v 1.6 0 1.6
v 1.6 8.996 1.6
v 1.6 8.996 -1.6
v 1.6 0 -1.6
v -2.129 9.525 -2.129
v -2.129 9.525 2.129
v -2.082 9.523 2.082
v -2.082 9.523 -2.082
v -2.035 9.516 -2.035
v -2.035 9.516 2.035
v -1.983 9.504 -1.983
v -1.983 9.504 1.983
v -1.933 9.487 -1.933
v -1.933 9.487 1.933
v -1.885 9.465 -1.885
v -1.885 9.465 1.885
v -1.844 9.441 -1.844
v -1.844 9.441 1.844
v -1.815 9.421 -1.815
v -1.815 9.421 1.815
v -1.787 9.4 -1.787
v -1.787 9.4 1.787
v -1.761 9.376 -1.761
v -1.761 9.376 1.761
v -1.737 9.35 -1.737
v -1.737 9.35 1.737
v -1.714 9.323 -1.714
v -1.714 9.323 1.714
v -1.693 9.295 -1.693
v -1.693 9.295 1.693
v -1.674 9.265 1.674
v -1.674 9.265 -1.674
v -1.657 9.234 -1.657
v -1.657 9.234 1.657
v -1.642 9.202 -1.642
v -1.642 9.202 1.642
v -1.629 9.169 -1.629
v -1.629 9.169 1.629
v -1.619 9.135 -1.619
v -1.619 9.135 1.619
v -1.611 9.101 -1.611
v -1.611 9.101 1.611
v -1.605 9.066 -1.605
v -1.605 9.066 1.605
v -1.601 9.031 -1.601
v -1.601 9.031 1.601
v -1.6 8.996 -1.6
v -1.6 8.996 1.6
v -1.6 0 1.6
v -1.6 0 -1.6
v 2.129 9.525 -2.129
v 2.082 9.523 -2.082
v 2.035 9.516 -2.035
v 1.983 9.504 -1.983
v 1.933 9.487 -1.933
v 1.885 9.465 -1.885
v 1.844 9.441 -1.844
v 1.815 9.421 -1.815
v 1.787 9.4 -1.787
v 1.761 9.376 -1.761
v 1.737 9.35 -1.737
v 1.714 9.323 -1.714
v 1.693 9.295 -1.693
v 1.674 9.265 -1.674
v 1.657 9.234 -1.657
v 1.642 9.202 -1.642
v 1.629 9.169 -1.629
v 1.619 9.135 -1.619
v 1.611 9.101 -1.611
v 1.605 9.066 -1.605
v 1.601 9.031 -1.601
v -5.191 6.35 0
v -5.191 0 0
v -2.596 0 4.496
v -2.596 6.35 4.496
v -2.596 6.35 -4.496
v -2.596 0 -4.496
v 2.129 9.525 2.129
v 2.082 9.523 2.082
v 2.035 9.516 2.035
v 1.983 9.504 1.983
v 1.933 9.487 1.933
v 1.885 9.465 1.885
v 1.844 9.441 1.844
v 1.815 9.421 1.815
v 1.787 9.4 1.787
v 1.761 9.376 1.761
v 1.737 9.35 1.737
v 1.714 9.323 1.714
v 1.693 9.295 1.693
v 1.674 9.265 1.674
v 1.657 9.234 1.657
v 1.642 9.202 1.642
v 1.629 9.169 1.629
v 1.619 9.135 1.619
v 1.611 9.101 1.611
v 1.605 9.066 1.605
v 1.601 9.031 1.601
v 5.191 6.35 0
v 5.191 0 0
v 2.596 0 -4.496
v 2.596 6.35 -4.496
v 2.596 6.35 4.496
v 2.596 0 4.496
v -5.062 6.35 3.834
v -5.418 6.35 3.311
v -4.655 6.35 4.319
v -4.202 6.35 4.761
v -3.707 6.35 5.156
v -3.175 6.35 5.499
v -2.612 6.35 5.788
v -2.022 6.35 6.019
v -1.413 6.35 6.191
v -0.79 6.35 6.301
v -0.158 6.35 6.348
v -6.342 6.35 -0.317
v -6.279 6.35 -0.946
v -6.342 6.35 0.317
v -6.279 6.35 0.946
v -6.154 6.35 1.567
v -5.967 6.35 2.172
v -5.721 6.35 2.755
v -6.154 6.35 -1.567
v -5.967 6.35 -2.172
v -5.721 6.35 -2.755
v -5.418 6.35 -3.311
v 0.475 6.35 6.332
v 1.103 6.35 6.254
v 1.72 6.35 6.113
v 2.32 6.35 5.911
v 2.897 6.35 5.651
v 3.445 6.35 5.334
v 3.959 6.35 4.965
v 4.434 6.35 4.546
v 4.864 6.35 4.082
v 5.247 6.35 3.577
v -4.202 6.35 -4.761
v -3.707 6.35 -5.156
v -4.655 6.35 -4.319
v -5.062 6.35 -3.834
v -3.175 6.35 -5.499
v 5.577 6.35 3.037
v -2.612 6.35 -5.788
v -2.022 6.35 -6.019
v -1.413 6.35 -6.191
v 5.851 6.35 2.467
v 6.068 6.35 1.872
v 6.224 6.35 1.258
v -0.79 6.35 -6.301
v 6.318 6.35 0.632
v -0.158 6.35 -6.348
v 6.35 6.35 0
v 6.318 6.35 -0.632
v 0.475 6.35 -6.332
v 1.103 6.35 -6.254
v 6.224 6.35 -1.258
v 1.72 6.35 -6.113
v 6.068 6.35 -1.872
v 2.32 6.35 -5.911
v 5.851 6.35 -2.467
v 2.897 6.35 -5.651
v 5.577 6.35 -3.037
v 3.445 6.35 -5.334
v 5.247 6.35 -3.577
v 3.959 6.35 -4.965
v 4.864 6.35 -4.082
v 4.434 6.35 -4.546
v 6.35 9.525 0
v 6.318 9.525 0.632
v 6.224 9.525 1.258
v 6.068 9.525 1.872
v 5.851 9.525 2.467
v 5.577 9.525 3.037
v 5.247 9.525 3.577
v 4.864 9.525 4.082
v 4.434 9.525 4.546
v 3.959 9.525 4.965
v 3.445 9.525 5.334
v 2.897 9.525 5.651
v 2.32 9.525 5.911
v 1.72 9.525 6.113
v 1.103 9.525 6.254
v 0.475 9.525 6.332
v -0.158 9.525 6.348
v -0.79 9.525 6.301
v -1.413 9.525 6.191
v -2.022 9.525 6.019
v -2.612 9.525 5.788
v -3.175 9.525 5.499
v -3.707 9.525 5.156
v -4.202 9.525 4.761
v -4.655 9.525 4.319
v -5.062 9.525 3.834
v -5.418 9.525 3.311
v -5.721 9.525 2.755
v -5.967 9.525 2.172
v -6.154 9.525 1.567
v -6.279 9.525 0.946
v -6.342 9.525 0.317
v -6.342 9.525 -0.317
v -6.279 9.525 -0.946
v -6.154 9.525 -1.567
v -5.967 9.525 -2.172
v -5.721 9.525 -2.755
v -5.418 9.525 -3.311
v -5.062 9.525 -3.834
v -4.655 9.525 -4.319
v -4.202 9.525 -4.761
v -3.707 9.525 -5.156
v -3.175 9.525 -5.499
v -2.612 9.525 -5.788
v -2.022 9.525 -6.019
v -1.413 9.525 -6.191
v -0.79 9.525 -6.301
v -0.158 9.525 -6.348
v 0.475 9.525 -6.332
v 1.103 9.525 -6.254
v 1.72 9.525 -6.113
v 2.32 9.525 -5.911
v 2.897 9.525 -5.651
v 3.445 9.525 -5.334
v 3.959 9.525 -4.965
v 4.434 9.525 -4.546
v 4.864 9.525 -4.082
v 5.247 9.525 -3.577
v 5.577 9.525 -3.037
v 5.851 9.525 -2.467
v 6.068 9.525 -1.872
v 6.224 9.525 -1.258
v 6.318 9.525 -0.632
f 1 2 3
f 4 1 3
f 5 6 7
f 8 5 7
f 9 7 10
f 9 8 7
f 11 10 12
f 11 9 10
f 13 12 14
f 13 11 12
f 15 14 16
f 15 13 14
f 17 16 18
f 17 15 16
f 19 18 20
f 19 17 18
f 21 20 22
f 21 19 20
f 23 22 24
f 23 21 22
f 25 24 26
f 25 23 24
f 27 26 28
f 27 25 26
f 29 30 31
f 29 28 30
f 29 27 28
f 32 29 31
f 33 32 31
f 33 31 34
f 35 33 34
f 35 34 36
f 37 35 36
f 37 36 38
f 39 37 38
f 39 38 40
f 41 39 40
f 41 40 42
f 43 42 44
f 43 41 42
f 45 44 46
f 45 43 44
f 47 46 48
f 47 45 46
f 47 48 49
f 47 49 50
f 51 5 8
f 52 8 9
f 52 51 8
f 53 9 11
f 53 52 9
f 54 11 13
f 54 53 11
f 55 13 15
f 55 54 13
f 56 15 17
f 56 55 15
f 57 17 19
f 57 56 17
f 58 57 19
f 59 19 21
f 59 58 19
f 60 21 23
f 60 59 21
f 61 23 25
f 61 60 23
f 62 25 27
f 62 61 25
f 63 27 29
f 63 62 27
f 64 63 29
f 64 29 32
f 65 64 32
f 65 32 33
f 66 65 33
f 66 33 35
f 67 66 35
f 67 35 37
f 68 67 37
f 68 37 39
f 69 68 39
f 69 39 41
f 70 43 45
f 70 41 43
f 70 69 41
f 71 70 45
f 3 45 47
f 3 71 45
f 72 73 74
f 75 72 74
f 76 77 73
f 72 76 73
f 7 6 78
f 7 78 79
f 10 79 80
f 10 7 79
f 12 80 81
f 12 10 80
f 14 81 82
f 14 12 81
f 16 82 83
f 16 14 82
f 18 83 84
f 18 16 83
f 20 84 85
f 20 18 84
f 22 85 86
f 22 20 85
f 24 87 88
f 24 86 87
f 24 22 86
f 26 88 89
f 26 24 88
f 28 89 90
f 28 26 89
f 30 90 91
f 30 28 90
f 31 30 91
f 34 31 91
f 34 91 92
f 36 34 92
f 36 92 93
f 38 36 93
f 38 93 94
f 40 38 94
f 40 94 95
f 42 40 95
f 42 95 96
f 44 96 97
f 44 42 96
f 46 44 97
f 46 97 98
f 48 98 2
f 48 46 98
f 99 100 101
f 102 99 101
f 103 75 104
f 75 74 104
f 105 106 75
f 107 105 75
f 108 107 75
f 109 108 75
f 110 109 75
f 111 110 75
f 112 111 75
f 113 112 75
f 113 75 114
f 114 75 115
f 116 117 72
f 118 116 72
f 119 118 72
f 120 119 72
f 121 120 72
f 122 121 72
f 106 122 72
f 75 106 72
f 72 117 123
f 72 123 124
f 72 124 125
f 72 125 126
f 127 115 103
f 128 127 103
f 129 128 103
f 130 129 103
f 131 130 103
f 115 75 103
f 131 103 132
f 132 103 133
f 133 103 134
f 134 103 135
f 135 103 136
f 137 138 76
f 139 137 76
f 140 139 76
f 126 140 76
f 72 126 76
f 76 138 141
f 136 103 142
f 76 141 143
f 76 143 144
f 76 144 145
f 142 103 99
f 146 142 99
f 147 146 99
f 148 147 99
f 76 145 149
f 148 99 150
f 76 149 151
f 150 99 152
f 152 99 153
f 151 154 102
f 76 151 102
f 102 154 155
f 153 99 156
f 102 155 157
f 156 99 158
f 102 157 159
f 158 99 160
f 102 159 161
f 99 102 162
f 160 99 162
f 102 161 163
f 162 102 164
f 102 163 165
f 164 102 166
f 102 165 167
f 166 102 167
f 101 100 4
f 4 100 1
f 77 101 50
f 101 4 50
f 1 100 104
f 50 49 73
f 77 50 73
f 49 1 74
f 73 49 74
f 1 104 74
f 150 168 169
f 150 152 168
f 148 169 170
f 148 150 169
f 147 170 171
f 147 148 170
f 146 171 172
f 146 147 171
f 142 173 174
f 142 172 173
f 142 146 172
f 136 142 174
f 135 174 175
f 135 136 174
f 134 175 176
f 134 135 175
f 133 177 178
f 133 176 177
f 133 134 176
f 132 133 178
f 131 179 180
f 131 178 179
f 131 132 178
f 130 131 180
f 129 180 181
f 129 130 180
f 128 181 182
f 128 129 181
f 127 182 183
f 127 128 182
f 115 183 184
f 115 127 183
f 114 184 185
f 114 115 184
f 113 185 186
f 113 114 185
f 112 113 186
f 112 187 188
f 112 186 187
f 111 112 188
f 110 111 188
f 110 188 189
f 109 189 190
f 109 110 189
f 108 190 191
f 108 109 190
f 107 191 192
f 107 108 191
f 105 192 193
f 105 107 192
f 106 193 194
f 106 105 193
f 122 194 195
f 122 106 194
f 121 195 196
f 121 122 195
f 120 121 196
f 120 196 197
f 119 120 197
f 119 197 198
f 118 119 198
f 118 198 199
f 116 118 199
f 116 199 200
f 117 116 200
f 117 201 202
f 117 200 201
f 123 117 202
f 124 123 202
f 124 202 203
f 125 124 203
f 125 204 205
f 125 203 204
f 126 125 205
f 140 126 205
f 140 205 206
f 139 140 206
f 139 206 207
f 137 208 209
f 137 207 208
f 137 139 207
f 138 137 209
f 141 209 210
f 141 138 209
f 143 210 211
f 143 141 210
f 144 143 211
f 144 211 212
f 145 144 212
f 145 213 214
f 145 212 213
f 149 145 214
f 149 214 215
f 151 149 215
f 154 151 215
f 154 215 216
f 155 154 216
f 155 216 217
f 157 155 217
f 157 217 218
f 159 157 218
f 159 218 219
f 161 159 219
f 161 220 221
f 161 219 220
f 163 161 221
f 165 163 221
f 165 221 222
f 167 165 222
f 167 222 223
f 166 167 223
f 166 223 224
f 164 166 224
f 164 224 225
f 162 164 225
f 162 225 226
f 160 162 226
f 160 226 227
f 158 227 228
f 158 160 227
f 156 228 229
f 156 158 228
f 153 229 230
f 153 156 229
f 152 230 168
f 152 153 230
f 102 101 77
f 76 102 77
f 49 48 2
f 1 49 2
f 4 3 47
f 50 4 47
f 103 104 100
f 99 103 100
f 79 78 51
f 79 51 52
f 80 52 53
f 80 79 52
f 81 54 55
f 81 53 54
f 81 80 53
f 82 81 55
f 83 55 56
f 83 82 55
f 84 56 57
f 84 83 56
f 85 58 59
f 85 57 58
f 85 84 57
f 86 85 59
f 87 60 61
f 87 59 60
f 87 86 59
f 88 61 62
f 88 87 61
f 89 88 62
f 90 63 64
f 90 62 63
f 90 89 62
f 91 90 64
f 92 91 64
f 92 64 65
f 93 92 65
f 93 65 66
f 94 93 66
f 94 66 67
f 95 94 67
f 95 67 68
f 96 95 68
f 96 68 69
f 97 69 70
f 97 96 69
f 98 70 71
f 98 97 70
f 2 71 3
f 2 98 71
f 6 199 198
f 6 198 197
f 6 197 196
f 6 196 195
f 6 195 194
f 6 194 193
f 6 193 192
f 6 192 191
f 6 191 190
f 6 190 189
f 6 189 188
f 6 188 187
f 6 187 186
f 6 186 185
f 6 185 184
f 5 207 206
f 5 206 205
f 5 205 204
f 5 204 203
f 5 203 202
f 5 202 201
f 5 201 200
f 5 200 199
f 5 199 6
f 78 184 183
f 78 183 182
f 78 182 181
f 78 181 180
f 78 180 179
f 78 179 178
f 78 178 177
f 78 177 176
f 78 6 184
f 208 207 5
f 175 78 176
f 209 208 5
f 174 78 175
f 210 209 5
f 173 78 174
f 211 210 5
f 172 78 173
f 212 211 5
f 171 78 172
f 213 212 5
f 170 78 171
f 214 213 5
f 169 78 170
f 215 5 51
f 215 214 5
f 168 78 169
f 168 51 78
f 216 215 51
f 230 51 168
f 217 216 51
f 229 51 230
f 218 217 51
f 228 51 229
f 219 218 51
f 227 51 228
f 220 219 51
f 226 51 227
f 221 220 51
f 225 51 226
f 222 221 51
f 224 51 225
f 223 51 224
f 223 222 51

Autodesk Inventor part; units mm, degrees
ref_plane "YZ Plane" through (0, 0, 0) normal (1, 0, 0) x (0, 1, 0)
ref_plane "XZ Plane" through (0, 0, 0) normal (0, 1, 0) x (-1, 0, 0)
ref_plane "XY Plane" through (0, 0, 0) normal (0, 0, 1) x (1, 0, 0)
sketch "Sketch1" plane through (0, 0, 0) normal (0, 1, 0) x (-1, 0, 0)
  line L0 (-5.4846, 0) -> (-2.7423, 4.7498)
  line L1 (-2.7423, 4.7498) -> (2.7423, 4.7498)
  line L2 (2.7423, 4.7498) -> (5.4846, 0)
  line L3 (5.4846, 0) -> (2.7423, -4.7498)
  line L4 (2.7423, -4.7498) -> (-2.7423, -4.7498)
  line L5 (-2.7423, -4.7498) -> (-5.4846, 0)
  line L6 (-2.5957, -4.4958) -> (2.5957, -4.4958)
  line L7 (2.5957, -4.4958) -> (5.1913, 0)
  line L8 (5.1913, 0) -> (2.5957, 4.4958)
  line L9 (2.5957, 4.4958) -> (-2.5957, 4.4958)
  line L10 (-2.5957, 4.4958) -> (-5.1913, 0)
  line L11 (-5.1913, 0) -> (-2.5957, -4.4958)
  point P0 (0, 0)
  point P1 (0, 0)
  dimension "d0" = 9.4996
  dimension "d1" = 0.254
extrude "Extrusion1" add sketch "Sketch1" along normal blind 6.35 contours L11 L10 L9 L8 L7 L6
sketch "Sketch2" plane through (0, 6.35, 0) normal (0, 1, 0) x (1, 0, 0)
  circle A0 centre (0, 0) radius 6.35
  line L0 (1.6002, -1.6002) -> (-1.6002, -1.6002)
  line L1 (-1.6002, -1.6002) -> (-1.6002, 1.6002)
  line L2 (-1.6002, 1.6002) -> (1.6002, 1.6002)
  line L3 (1.6002, 1.6002) -> (1.6002, -1.6002)
  line L4 (1.6002, -1.6002) -> (-1.6002, 1.6002) construction
  line L5 (-1.6002, -1.6002) -> (1.6002, 1.6002) construction
  dimension "d4" = 12.7
  dimension "d5" = 3.2004
  dimension "d6" = 3.2004
extrude "Extrusion2" add sketch "Sketch2" along normal blind 3.175
sketch "Sketch3" plane through (0, 9.525, 0) normal (0, 1, 0) x (1, 0, 0)
  line L0 (-1.6002, -1.6002) -> (-1.6002, 1.6002) projected
  line L1 (-1.6002, 1.6002) -> (-1.6002, -1.6002) projected
  line L2 (-1.6002, -1.6002) -> (1.6002, -1.6002) projected
  line L3 (1.6002, -1.6002) -> (1.6002, 1.6002) projected
  line L4 (1.6002, 1.6002) -> (-1.6002, 1.6002) projected
  point P0 (0, 0)
extrude "Extrusion3" cut sketch "Sketch3" against normal through all
fillet "Fillet1" radius 0.5292 4 edges at (0, 9.525, -1.6002) (1.6002, 9.525, 0) (-1.6002, 9.525, 0) (0, 9.525, 1.6002)
properties part number "Flex Wheel Connector"
